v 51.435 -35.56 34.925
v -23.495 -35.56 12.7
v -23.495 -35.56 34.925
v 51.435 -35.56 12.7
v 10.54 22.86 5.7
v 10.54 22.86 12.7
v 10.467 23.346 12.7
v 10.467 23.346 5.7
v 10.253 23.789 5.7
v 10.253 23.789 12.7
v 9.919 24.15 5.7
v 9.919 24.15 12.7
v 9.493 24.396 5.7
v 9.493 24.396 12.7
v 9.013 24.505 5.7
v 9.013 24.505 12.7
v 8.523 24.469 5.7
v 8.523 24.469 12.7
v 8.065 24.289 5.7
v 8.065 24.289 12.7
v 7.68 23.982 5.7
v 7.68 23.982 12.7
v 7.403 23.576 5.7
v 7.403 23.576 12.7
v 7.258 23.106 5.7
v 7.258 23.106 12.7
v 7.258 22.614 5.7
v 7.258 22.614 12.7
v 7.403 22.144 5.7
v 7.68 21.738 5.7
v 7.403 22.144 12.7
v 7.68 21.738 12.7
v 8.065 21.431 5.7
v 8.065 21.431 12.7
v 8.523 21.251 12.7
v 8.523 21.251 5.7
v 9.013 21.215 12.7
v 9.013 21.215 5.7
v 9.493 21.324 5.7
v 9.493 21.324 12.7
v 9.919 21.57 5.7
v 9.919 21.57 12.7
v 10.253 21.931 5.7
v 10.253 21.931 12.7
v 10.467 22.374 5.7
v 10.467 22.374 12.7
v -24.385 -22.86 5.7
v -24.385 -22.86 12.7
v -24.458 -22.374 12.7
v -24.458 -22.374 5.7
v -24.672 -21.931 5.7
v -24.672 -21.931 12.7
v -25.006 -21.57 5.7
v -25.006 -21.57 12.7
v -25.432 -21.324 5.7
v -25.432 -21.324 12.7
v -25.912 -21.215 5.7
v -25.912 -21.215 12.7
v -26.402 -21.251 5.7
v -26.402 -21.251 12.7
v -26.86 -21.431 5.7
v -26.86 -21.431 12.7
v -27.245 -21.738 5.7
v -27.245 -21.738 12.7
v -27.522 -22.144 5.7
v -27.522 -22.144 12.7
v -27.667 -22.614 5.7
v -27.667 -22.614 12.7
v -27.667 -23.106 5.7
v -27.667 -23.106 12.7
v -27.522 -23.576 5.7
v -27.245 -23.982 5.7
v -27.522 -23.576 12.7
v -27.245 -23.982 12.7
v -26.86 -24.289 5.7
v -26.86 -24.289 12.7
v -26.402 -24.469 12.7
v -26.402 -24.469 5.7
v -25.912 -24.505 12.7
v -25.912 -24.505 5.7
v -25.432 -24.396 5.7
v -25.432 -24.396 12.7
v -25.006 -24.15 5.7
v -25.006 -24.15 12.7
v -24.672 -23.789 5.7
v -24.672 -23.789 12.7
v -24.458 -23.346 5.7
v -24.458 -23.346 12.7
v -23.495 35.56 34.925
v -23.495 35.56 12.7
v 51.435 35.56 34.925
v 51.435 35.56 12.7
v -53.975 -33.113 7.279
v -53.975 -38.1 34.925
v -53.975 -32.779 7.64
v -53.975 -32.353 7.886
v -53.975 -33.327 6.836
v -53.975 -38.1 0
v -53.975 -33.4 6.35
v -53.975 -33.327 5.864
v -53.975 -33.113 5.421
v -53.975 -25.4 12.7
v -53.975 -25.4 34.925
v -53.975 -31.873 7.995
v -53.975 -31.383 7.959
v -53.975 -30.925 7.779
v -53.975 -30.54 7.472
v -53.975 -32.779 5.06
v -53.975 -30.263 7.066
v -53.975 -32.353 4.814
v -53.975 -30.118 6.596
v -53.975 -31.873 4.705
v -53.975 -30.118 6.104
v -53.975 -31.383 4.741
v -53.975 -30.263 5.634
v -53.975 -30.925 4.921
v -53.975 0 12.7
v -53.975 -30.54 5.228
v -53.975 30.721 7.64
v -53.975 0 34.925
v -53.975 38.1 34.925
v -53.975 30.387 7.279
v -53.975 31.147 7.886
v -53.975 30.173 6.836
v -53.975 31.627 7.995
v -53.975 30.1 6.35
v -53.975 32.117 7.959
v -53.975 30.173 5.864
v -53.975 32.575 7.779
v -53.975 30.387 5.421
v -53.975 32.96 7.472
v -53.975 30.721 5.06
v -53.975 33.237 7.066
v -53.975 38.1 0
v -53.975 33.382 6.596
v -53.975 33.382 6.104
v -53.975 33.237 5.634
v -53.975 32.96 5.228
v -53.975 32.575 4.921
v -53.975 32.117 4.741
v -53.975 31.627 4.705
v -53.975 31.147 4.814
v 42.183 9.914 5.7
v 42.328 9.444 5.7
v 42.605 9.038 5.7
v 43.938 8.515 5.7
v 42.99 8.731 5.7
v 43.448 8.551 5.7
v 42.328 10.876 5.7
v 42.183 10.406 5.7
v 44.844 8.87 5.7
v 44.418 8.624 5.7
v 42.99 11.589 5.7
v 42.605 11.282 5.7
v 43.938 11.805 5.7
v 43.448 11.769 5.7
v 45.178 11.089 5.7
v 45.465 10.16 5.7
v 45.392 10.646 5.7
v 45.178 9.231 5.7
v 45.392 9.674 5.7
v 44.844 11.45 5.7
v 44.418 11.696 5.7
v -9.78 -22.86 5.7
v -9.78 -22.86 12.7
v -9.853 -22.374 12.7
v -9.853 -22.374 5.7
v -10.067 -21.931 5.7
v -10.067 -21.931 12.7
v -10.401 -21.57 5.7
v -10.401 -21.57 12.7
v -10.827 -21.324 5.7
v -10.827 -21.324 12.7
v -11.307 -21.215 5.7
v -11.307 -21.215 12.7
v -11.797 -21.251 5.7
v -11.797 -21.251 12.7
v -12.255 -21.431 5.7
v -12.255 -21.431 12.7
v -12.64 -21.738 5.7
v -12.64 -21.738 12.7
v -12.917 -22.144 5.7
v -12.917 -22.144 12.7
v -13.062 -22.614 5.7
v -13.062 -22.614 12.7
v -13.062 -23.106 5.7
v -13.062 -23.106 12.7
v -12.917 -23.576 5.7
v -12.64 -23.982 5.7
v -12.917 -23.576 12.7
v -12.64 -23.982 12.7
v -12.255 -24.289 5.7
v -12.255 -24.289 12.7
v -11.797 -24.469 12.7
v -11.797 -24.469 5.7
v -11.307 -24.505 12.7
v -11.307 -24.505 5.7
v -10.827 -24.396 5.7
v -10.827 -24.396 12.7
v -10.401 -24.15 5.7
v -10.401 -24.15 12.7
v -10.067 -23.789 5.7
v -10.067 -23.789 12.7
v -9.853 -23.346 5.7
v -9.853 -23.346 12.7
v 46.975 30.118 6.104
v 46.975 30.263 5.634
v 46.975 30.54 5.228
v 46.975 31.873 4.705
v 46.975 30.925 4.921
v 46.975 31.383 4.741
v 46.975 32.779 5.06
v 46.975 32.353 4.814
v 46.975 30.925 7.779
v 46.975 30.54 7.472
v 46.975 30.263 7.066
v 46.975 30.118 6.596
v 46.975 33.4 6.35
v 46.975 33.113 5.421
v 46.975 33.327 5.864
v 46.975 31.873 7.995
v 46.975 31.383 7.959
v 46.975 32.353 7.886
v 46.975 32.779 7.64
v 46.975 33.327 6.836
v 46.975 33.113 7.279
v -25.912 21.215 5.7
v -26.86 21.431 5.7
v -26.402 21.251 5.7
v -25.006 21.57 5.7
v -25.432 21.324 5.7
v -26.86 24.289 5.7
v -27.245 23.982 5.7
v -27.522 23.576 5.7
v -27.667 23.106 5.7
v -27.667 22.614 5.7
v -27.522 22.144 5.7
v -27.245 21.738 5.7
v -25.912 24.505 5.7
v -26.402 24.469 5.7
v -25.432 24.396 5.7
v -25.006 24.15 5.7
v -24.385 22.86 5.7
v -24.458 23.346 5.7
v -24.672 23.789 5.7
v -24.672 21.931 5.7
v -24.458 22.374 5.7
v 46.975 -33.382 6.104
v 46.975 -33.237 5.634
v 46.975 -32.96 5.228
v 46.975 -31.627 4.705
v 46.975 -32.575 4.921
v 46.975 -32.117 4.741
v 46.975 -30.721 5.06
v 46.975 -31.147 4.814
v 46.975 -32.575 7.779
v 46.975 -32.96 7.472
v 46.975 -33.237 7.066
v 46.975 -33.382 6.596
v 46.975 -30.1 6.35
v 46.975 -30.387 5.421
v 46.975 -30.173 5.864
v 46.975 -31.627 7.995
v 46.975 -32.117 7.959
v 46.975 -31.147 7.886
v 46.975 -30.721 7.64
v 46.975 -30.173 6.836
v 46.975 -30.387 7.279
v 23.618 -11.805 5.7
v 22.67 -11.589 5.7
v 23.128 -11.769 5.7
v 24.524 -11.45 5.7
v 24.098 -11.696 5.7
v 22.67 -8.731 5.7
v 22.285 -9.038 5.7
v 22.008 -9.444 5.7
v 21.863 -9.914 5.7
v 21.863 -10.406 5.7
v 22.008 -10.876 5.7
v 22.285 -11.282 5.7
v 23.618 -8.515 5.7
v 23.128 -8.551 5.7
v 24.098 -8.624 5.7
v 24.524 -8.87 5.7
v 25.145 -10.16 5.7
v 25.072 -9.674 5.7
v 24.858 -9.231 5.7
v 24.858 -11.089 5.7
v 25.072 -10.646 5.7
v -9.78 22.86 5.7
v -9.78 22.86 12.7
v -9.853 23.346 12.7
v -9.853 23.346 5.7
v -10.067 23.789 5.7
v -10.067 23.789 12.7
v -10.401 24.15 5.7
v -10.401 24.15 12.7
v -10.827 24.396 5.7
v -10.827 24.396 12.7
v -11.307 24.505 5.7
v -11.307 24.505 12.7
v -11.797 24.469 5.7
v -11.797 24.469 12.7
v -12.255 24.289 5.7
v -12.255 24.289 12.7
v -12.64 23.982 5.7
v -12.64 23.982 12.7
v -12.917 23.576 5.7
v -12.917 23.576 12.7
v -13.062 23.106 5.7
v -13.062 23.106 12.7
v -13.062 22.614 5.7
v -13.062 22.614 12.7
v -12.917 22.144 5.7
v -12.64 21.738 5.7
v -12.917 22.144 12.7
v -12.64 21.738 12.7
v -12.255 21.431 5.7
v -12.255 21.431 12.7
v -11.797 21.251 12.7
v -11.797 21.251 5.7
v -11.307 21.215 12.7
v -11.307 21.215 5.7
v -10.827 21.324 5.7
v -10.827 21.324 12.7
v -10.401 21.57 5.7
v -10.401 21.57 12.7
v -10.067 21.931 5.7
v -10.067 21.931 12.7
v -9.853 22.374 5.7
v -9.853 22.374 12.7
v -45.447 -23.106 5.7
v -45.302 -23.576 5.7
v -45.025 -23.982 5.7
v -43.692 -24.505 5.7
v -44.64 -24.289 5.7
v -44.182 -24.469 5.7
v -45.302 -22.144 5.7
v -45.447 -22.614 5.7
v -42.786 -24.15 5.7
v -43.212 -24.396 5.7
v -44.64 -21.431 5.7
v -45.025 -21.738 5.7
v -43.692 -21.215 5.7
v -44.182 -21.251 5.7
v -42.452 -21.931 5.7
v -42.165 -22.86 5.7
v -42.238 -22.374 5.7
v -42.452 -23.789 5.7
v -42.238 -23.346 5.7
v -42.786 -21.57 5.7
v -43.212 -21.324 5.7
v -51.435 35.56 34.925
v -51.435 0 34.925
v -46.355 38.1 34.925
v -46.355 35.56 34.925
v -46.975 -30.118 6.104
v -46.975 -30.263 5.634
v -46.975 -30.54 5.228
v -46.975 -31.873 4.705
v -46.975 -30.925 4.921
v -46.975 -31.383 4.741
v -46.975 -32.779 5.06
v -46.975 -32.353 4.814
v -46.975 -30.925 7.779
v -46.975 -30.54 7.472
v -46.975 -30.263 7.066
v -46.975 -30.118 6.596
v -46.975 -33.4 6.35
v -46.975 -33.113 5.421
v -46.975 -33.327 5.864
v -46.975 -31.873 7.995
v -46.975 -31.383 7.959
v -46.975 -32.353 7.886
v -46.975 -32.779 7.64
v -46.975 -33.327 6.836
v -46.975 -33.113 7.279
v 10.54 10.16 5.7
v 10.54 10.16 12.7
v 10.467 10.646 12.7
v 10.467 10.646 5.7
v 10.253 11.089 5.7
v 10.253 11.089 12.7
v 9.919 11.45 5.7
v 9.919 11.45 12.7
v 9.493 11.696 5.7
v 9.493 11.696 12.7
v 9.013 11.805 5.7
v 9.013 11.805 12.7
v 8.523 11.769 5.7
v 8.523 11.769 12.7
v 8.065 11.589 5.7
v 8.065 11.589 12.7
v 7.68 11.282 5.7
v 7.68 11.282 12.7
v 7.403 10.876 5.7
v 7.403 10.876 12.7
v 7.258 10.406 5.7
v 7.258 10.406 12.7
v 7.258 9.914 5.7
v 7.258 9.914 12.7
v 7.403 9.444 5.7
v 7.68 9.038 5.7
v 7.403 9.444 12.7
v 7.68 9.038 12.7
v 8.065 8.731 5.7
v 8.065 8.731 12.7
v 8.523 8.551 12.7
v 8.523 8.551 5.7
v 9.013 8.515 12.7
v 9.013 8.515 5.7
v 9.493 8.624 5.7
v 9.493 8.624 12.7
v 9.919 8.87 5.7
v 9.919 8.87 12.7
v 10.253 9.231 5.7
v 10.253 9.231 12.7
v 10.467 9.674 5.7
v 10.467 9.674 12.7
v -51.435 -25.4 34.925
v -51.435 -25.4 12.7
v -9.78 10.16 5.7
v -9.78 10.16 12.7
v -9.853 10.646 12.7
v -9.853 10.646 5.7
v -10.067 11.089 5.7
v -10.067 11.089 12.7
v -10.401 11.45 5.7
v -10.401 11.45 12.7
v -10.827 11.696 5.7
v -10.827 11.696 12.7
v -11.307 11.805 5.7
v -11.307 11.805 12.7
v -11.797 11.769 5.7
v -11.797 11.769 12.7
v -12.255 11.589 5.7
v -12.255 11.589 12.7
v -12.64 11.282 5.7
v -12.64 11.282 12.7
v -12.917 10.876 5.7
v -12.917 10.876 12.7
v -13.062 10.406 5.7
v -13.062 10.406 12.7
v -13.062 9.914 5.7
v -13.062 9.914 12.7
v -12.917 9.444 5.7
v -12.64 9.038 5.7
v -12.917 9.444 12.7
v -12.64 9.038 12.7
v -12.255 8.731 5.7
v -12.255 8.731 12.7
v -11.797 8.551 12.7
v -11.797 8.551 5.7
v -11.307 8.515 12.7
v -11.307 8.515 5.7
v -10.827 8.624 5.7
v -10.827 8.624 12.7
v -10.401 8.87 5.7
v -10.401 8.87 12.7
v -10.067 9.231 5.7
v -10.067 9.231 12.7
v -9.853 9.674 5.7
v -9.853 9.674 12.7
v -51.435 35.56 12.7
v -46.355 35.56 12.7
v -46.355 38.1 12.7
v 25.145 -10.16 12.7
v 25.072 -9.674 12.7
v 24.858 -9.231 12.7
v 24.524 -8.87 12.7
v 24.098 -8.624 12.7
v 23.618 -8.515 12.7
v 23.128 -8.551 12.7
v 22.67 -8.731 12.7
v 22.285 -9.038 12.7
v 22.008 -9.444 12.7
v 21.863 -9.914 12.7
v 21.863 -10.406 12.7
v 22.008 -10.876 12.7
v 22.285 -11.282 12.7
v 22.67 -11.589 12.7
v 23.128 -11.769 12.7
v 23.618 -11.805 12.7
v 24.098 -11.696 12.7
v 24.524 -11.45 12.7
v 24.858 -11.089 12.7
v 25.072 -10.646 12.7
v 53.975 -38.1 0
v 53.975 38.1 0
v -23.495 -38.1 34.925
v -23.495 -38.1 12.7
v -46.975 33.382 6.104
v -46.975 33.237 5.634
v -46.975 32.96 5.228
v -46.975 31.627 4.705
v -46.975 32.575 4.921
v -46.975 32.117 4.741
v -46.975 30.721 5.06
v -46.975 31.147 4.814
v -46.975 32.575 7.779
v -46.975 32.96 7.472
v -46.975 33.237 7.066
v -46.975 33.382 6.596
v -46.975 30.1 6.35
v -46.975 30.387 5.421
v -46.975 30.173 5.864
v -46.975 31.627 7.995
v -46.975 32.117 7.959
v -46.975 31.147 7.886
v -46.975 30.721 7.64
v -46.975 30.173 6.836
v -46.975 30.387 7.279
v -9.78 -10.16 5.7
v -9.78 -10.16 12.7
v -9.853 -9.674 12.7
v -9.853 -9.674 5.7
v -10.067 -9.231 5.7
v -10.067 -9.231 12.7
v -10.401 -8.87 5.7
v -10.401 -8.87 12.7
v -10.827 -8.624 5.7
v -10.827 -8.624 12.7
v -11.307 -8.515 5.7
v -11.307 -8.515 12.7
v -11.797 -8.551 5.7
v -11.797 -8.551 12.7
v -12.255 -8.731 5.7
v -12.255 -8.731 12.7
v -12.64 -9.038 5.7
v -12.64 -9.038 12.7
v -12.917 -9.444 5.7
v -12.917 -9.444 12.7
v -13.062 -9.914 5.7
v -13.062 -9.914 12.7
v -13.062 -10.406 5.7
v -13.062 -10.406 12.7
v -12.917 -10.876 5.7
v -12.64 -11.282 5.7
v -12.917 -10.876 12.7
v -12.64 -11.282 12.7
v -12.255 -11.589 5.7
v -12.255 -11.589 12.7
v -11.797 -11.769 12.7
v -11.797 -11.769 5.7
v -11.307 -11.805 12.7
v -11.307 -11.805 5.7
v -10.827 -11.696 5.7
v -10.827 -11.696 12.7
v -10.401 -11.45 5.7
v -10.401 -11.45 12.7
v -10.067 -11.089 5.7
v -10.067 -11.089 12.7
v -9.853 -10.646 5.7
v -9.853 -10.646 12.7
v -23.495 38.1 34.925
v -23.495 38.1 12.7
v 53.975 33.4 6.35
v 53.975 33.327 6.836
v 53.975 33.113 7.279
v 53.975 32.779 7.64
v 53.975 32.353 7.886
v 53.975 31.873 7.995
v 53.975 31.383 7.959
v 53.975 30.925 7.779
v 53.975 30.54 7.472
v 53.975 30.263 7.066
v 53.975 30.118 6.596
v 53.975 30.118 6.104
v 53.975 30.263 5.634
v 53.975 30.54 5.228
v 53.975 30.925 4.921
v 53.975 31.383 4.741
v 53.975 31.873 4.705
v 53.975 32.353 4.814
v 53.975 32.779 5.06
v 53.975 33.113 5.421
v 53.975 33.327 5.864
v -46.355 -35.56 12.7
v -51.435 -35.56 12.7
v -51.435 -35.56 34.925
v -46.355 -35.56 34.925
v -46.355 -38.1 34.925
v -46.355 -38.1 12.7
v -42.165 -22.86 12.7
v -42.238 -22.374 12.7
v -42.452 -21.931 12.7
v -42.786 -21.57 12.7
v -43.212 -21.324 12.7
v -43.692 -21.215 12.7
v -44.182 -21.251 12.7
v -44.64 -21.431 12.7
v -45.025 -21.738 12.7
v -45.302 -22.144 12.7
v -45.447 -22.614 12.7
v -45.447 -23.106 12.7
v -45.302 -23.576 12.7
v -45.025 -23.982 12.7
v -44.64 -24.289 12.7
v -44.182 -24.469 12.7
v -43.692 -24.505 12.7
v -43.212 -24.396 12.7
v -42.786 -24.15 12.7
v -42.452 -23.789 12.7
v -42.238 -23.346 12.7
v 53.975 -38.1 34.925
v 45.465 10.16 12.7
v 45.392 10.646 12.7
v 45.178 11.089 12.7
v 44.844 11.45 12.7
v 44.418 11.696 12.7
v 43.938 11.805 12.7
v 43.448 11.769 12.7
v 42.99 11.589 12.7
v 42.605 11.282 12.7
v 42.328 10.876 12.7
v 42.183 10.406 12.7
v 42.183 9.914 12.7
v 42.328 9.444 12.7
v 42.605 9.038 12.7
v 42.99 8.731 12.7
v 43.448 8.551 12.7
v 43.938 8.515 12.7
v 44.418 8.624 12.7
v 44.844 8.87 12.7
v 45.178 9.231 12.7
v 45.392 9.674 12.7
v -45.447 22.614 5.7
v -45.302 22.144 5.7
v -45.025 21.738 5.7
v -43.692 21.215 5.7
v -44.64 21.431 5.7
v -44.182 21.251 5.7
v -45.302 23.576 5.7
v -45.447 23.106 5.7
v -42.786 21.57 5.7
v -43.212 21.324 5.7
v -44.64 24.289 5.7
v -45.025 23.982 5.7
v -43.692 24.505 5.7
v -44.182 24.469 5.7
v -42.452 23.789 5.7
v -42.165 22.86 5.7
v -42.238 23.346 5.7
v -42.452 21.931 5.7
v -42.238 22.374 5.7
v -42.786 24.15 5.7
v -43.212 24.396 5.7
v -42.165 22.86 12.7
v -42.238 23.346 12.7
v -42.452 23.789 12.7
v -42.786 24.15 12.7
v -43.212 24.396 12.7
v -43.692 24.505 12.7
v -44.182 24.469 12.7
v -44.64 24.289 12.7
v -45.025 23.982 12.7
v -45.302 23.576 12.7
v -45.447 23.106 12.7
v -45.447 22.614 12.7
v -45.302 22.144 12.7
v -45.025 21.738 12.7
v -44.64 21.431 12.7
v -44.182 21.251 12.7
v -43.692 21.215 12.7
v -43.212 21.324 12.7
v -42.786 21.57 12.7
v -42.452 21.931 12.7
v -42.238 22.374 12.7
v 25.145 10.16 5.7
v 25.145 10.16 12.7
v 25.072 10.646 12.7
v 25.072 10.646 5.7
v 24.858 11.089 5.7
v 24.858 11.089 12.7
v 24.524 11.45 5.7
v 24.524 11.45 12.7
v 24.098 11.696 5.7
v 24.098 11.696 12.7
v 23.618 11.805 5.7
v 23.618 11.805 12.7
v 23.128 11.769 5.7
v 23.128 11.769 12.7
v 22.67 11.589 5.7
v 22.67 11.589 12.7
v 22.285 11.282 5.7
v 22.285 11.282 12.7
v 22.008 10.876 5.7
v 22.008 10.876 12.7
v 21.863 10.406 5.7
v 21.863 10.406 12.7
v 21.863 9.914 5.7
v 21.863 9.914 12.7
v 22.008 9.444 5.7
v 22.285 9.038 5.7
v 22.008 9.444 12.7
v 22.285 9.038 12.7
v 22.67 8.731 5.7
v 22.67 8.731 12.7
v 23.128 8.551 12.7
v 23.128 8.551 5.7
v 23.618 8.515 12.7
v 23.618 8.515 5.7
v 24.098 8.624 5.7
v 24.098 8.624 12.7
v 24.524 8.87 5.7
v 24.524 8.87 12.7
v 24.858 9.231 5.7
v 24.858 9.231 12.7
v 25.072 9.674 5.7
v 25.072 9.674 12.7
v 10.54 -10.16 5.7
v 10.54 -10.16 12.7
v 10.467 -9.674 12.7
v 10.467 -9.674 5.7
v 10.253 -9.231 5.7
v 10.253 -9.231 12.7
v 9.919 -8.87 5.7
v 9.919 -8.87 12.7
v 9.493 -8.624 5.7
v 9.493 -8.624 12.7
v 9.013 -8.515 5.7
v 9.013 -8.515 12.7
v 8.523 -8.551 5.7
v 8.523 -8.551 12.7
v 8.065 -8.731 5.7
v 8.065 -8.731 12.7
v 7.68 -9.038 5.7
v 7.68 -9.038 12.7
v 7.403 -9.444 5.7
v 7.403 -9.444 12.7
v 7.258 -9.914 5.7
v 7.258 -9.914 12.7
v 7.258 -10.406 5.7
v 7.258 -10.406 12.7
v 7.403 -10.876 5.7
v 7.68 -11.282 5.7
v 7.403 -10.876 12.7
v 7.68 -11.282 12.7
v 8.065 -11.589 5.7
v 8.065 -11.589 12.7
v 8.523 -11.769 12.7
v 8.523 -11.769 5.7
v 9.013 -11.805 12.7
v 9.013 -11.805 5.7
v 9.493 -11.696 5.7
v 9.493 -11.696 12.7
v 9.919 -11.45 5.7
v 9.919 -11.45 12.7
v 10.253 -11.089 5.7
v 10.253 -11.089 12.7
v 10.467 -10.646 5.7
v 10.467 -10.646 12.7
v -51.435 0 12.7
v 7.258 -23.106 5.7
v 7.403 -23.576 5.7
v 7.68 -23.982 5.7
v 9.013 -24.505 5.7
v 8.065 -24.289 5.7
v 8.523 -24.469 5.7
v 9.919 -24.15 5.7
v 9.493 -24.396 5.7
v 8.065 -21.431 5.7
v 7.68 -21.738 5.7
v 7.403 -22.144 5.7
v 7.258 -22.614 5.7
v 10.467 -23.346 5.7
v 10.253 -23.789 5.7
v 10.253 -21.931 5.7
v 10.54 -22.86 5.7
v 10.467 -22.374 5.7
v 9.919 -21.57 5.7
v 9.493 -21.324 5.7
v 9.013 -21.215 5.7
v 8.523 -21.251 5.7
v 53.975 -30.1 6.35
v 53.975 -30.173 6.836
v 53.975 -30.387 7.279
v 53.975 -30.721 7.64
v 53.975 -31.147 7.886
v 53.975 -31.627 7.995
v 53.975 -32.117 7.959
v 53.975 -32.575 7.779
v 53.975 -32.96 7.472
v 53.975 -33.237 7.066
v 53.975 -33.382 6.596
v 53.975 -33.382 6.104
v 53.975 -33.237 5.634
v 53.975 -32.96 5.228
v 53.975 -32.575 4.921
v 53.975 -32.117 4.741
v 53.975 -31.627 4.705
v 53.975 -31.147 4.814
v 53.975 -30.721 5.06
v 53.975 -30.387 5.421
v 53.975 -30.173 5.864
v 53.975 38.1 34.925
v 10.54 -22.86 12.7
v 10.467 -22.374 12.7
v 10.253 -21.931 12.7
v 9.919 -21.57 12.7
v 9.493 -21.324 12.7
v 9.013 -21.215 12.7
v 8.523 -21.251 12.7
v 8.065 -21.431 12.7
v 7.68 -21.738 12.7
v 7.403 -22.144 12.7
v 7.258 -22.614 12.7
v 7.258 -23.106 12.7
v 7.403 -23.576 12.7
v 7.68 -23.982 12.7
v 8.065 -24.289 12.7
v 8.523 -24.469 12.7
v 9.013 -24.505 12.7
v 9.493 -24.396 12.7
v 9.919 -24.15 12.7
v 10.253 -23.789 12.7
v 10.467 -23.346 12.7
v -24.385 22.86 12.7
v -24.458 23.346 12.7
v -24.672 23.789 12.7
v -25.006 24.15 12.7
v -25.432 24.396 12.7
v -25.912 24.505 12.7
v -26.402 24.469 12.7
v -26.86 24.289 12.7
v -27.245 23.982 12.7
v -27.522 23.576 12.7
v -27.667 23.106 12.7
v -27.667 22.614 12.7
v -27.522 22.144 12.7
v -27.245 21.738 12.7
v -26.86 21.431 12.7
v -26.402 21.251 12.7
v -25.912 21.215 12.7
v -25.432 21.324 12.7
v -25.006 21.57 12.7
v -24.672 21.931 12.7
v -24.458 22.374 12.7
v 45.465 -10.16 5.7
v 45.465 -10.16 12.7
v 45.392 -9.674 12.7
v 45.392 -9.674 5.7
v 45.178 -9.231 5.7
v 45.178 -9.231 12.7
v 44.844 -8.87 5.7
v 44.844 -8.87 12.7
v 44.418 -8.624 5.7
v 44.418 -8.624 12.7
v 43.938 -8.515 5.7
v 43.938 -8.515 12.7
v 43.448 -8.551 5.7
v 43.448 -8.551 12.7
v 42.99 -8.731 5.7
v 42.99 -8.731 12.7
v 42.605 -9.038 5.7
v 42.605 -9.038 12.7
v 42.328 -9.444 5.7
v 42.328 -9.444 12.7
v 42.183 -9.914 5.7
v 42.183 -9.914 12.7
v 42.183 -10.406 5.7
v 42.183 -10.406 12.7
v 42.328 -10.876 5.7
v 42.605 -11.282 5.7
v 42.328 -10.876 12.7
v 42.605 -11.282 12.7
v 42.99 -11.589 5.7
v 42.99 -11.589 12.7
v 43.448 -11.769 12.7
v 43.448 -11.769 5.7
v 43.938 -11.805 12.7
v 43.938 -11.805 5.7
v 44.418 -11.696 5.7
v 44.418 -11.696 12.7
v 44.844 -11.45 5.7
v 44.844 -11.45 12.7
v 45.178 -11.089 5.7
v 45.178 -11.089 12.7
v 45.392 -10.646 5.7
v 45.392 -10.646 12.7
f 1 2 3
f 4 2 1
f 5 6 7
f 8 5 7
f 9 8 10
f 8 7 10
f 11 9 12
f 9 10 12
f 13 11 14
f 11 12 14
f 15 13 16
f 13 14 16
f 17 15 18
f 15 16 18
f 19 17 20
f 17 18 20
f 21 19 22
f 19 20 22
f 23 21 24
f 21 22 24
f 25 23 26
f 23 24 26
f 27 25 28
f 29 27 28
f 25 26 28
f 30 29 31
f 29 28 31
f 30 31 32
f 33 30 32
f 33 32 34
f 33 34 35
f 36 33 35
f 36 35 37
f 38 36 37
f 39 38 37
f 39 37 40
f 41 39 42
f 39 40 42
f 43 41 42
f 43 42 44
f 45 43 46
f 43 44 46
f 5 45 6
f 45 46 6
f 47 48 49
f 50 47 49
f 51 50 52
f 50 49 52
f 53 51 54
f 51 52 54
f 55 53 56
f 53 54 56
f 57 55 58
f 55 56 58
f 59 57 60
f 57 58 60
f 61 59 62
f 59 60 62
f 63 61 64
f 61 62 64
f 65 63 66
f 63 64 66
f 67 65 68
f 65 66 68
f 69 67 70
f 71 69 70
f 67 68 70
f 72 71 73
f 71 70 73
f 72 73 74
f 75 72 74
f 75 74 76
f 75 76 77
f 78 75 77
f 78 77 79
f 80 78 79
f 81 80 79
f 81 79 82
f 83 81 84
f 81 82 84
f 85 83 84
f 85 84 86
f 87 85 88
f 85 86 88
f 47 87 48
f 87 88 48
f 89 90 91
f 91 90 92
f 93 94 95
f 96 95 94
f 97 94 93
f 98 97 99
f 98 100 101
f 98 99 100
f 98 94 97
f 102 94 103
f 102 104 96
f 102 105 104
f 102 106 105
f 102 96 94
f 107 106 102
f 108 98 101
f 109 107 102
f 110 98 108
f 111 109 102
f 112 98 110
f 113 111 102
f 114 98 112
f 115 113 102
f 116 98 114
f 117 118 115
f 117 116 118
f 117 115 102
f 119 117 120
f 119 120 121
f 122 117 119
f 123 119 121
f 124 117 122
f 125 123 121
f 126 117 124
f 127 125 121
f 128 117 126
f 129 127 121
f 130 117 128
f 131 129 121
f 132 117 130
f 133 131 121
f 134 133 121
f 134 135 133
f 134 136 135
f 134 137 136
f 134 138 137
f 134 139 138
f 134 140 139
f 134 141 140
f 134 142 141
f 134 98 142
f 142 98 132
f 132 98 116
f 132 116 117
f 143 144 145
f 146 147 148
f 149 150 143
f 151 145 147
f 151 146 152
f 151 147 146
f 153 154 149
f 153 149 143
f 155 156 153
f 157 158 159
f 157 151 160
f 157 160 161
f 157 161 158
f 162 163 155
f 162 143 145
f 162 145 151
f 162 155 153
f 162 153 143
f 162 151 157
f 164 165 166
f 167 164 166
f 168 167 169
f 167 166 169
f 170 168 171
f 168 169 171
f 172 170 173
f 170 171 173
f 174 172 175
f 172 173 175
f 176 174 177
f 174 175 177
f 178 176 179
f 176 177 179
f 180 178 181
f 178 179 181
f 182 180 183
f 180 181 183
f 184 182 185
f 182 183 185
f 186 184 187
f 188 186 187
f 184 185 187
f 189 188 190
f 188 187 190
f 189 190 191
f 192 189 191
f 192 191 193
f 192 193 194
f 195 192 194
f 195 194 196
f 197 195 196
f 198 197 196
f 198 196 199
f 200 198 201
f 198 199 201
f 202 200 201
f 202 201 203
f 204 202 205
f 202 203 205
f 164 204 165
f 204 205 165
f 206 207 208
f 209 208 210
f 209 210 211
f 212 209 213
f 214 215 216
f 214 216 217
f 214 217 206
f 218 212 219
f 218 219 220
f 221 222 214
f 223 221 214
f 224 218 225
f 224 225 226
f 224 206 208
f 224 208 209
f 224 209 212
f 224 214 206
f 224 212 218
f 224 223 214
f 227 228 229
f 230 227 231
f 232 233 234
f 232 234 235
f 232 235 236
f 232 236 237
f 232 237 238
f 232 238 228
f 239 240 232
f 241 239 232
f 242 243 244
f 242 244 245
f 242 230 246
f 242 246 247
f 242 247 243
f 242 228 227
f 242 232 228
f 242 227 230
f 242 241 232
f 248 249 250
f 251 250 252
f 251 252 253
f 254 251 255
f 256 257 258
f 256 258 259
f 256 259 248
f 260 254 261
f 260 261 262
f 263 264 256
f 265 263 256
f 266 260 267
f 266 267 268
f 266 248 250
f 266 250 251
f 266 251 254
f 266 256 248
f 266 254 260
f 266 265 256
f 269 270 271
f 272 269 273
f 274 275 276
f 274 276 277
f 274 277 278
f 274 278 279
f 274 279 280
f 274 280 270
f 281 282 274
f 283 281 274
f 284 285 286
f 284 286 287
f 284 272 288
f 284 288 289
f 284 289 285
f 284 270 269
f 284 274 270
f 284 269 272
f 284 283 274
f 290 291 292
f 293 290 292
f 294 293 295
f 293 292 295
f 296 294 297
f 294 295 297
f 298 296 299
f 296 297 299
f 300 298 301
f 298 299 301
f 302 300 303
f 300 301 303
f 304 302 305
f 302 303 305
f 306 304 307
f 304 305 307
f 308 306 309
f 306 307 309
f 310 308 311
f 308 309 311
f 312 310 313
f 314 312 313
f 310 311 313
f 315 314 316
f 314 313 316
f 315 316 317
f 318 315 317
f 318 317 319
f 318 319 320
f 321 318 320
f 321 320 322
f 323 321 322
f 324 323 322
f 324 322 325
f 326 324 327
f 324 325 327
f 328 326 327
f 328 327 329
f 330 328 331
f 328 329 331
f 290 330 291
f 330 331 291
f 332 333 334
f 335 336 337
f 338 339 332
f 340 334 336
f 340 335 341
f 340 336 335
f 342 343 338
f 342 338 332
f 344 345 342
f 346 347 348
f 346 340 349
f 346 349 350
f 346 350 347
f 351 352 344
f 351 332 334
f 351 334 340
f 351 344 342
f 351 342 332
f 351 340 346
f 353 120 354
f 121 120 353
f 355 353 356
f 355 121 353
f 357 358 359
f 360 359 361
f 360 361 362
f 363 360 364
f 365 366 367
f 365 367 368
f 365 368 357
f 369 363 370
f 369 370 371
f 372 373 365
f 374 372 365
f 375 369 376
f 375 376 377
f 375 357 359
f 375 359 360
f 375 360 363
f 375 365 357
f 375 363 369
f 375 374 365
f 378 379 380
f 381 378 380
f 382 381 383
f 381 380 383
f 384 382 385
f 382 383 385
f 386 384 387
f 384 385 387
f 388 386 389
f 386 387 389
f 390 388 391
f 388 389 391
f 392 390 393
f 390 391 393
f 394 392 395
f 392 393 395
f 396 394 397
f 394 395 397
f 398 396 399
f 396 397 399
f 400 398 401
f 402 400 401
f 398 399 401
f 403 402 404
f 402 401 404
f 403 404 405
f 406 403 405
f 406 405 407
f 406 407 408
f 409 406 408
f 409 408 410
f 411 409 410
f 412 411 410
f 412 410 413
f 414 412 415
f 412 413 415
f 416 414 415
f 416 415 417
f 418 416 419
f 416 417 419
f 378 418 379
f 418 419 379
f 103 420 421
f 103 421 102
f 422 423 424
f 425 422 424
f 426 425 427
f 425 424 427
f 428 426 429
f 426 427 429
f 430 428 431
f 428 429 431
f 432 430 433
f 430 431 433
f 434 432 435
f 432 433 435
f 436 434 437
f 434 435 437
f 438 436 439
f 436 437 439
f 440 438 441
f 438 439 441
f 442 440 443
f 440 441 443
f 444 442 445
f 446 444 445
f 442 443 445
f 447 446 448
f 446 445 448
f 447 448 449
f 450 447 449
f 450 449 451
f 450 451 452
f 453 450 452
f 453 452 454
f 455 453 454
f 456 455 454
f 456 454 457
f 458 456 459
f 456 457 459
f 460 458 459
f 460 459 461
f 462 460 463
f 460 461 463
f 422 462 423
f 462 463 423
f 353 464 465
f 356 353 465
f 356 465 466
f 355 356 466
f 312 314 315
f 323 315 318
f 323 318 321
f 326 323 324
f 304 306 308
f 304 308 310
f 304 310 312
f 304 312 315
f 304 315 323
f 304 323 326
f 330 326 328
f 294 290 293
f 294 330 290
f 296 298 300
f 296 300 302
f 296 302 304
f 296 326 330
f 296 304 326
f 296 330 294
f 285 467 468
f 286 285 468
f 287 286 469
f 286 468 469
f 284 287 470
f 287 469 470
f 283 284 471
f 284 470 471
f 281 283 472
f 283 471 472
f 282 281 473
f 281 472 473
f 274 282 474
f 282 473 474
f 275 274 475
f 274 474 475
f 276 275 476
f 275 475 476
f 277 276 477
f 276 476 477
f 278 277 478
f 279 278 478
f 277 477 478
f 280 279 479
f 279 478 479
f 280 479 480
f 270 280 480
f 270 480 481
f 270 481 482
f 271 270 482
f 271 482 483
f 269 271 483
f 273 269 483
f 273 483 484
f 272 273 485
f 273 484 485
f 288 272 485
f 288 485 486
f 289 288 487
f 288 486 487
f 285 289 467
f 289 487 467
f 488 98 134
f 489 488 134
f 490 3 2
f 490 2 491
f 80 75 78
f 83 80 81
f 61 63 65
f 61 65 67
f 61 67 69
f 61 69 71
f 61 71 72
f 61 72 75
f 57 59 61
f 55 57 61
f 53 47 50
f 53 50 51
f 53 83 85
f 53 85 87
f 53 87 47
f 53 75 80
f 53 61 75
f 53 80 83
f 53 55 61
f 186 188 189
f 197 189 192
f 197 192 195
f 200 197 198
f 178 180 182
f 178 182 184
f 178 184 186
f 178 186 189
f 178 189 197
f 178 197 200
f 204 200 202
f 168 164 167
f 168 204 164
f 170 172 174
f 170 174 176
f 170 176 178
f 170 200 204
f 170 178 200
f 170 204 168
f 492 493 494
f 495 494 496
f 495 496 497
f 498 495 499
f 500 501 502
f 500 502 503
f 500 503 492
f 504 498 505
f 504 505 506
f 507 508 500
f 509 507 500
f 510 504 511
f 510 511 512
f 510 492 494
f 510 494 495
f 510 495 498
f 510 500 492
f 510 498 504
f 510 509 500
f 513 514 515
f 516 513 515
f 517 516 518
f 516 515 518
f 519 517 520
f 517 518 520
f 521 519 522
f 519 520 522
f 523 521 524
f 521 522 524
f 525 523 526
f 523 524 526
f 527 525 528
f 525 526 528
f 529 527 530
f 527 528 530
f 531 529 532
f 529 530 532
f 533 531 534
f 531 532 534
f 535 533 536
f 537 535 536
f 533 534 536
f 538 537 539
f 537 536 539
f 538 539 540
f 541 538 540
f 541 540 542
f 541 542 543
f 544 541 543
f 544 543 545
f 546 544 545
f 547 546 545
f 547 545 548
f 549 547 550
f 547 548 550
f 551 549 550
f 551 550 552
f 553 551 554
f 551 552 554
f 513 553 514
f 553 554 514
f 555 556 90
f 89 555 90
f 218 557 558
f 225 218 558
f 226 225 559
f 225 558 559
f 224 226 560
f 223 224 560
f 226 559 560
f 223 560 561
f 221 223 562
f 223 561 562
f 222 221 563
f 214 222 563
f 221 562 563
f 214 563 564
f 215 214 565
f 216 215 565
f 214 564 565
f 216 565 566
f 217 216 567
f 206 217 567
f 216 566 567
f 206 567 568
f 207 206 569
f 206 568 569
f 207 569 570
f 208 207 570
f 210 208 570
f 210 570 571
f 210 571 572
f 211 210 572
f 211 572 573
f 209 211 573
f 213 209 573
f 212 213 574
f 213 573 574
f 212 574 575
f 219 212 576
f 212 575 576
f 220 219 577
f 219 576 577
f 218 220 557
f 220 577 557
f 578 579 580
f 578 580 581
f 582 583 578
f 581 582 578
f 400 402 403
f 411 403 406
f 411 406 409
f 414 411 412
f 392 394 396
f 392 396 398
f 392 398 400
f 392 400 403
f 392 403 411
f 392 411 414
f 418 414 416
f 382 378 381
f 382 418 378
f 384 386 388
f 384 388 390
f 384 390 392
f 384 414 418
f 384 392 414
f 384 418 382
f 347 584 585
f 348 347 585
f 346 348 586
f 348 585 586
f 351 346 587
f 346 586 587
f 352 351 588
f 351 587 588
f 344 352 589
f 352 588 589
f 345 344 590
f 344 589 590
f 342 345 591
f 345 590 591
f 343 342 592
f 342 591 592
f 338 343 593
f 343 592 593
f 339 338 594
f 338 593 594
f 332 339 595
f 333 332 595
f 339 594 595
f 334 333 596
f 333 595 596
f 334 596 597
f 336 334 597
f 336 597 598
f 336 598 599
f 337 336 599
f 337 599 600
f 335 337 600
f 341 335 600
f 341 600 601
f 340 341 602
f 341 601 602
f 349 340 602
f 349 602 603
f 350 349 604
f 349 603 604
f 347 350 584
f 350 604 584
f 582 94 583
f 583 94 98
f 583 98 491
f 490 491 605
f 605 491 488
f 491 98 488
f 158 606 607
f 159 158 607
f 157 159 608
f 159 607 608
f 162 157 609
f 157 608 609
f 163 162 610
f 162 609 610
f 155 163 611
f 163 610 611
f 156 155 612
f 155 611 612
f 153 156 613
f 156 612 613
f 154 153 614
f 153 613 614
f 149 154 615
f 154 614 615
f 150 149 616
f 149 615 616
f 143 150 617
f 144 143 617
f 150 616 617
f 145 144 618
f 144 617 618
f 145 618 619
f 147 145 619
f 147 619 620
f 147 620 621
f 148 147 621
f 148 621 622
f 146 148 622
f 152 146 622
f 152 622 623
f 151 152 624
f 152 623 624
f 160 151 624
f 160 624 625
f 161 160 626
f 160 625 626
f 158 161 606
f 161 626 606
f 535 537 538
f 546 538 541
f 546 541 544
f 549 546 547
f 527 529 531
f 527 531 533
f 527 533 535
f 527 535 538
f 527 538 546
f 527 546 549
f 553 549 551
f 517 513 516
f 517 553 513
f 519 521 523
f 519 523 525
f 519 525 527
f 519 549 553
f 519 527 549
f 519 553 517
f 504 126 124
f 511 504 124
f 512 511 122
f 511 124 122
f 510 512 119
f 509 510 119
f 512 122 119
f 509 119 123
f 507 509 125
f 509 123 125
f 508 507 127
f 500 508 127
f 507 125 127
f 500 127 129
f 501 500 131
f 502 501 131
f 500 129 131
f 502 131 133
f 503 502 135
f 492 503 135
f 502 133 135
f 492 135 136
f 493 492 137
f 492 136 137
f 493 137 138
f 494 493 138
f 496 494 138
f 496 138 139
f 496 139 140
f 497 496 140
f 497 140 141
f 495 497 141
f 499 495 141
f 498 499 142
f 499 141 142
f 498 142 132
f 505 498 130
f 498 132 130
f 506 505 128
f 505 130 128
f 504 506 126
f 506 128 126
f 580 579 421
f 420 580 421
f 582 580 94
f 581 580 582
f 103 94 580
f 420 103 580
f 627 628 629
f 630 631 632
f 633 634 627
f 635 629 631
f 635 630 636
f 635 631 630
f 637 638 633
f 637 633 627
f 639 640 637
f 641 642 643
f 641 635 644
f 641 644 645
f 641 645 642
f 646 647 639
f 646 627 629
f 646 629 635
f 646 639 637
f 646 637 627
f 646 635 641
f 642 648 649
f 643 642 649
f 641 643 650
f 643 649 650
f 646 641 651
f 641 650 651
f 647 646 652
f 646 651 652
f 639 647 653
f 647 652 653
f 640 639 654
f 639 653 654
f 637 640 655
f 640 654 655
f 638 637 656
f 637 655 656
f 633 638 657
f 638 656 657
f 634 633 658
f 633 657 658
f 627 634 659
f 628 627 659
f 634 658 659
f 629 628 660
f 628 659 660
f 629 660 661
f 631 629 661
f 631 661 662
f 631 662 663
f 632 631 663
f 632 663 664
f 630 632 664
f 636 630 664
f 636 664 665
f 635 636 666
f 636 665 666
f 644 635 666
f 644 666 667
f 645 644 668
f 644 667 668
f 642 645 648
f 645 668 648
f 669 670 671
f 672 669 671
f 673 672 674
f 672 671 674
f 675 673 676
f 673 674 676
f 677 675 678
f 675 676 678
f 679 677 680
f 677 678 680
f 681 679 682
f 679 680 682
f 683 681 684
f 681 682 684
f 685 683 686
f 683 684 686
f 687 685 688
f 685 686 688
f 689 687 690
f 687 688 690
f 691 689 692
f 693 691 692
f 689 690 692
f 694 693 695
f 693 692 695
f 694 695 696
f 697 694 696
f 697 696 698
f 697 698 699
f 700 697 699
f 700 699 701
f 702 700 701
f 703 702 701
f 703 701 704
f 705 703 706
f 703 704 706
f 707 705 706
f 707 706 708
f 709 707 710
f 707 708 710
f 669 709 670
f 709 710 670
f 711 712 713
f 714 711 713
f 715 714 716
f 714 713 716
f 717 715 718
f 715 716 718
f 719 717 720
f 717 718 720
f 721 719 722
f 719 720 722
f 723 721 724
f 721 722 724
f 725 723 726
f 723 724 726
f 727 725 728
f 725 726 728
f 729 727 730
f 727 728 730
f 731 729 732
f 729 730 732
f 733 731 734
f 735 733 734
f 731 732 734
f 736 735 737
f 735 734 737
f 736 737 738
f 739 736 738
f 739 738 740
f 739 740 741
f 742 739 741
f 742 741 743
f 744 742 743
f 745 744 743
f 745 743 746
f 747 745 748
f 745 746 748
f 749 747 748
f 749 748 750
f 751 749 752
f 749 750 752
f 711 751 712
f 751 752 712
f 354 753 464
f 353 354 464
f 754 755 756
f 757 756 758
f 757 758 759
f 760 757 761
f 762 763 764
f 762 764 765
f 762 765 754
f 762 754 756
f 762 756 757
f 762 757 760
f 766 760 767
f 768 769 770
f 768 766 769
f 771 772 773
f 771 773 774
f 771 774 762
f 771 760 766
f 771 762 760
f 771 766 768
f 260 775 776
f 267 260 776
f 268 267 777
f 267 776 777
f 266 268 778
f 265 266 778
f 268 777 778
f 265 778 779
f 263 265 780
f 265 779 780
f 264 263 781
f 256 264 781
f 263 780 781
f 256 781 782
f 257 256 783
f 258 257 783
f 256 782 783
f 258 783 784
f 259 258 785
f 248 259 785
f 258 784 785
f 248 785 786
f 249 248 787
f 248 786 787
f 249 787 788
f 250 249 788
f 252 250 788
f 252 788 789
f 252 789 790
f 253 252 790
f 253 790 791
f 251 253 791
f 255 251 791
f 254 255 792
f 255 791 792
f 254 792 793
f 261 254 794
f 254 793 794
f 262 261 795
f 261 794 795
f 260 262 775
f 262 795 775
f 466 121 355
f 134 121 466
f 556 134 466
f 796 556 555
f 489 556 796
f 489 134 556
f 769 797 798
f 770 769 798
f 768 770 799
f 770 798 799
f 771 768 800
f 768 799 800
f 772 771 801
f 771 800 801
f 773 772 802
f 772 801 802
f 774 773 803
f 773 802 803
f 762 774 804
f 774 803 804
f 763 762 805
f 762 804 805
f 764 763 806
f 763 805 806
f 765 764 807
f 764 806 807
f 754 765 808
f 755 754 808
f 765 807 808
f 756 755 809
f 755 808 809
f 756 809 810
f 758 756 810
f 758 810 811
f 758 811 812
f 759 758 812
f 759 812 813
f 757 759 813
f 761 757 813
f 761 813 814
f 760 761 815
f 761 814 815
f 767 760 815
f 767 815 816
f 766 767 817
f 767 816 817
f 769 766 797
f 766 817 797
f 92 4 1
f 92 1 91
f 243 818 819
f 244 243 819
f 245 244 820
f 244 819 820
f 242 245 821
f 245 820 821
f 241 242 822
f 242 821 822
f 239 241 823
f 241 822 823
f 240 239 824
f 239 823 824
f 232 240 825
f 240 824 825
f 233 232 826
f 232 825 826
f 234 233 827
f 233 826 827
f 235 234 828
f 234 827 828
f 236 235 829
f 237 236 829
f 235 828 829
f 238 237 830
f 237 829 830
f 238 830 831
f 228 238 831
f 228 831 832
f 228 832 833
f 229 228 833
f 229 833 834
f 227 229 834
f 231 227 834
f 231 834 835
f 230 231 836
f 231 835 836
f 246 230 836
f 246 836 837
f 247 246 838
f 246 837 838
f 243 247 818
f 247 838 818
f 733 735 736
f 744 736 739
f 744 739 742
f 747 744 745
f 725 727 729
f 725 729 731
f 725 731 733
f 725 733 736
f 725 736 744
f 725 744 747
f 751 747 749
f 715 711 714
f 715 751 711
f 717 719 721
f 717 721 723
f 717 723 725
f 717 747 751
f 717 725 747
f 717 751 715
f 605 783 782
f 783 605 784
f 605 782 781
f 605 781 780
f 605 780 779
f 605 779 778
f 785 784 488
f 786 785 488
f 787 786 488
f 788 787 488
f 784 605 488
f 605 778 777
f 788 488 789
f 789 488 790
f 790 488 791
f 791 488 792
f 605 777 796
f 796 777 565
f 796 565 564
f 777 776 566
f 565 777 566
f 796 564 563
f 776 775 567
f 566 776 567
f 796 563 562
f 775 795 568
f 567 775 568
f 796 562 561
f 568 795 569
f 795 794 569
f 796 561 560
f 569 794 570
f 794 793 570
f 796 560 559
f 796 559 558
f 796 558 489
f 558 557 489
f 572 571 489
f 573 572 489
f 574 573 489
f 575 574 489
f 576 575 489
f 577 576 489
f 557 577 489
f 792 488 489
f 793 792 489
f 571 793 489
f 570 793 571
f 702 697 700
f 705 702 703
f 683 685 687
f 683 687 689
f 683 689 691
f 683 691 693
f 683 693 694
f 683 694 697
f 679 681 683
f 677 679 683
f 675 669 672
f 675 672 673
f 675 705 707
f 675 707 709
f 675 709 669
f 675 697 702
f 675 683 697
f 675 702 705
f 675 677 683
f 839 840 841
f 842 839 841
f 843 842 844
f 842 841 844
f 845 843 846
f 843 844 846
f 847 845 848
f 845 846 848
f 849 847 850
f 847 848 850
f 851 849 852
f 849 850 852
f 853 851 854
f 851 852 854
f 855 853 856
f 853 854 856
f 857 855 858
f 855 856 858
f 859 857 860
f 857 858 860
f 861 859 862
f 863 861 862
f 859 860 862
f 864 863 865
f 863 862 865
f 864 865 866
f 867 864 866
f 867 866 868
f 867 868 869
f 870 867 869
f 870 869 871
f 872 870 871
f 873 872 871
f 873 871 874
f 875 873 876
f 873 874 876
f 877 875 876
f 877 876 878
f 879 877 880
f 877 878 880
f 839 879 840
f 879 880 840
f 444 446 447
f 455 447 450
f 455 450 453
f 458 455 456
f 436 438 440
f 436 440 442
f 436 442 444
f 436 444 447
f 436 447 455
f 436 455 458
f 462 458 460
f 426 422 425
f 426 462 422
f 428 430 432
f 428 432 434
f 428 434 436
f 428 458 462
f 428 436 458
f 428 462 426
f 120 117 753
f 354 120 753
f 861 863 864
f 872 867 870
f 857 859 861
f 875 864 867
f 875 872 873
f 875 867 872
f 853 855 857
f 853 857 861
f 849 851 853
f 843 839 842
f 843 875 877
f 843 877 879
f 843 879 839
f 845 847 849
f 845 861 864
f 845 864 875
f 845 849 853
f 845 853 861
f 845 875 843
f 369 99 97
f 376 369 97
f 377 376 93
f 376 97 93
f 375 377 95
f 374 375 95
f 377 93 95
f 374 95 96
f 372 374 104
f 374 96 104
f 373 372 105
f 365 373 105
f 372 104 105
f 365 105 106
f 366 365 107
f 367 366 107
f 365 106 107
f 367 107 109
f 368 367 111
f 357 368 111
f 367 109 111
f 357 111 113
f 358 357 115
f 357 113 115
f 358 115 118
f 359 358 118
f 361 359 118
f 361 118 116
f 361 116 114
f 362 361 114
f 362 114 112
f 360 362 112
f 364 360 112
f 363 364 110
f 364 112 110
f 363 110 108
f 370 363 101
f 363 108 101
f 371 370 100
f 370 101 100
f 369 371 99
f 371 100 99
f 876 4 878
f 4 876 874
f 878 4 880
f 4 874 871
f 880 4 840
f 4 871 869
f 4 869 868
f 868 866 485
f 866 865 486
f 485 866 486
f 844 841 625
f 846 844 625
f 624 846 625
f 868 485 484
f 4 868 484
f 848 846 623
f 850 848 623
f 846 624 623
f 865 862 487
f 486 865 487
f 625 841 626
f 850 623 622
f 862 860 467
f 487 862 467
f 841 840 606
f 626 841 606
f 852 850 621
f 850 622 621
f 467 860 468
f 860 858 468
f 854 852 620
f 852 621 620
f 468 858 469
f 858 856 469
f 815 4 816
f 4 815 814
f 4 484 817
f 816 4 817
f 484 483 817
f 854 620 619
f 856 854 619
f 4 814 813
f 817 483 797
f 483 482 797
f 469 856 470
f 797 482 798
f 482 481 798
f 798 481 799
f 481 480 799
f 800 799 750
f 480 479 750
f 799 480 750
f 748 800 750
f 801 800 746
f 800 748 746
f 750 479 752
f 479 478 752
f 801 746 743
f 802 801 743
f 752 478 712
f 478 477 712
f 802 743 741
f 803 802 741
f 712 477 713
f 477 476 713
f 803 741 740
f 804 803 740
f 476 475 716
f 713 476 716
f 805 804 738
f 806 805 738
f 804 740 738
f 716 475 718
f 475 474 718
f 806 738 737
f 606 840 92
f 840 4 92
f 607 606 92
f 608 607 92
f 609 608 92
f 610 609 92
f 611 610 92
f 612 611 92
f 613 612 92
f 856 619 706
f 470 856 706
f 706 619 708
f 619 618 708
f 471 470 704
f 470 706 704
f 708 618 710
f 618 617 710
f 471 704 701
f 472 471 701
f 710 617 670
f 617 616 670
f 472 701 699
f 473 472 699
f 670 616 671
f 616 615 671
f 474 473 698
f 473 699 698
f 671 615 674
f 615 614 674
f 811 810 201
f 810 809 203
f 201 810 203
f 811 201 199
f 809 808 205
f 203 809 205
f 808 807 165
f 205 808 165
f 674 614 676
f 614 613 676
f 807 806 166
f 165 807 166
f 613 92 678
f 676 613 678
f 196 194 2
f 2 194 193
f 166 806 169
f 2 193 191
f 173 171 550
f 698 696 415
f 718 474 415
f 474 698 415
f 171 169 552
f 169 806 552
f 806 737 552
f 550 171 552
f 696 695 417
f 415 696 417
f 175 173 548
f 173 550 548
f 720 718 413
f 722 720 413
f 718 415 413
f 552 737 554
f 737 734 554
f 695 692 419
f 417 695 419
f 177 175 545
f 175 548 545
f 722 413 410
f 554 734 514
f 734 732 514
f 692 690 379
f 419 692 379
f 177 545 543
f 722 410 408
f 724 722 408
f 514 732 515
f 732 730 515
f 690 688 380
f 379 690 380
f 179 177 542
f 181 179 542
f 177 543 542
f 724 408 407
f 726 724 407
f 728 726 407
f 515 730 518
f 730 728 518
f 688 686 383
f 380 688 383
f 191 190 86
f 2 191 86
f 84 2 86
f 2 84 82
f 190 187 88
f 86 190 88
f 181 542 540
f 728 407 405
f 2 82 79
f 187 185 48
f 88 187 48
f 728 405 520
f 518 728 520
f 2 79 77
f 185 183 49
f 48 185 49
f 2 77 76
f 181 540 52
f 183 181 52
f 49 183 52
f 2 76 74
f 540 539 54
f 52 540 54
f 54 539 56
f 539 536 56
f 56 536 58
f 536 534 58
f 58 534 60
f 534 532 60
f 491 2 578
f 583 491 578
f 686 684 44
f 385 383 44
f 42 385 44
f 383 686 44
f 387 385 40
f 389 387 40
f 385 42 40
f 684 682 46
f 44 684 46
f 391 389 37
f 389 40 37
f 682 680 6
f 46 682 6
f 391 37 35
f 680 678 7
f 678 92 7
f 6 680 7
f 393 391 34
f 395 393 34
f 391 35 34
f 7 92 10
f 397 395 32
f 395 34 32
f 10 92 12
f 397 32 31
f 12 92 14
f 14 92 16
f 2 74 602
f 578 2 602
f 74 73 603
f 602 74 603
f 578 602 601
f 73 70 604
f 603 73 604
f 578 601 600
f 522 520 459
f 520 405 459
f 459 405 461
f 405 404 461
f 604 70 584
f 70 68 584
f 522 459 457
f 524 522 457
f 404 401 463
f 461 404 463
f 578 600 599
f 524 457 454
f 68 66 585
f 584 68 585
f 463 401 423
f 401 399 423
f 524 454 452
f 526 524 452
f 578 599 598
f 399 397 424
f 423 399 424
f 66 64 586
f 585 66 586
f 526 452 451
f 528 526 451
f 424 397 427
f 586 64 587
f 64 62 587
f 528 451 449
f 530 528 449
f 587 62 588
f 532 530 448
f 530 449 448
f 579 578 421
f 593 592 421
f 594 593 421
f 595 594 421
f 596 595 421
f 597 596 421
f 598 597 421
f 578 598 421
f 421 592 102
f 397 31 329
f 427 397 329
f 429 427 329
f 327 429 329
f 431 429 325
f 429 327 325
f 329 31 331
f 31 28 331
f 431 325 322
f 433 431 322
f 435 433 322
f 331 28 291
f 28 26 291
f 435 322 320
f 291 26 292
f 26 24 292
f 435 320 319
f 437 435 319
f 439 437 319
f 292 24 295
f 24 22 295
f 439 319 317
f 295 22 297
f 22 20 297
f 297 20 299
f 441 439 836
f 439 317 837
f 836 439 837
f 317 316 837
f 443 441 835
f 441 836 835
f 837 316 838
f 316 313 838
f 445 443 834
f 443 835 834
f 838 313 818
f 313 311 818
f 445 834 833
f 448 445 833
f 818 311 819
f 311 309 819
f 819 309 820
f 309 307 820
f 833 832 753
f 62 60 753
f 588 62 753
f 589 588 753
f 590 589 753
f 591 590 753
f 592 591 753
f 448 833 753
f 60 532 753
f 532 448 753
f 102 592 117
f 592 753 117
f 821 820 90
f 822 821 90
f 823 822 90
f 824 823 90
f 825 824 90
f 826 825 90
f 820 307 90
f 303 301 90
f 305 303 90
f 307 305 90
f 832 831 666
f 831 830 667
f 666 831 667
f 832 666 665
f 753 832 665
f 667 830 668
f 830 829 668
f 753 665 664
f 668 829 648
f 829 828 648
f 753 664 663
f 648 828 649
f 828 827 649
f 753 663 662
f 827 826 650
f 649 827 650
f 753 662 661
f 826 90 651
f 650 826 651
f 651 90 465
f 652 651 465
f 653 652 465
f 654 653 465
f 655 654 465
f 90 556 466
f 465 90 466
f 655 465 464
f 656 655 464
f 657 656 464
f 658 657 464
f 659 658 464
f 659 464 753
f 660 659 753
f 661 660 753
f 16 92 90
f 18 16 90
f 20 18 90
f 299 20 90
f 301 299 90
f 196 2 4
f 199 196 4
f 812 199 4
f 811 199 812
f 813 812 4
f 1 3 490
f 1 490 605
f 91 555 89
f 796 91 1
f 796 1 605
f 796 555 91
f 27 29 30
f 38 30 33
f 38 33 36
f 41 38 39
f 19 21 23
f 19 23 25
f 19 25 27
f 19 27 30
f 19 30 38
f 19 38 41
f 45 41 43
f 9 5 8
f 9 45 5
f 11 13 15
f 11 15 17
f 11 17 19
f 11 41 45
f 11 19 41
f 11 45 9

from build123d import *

# Parameters (mm, degrees)
SKETCH1_W          = 76.2
SKETCH1_H          = 107.95
BASE_DEPTH         = 12.7
SKETCH3_W          = 107.95
SKETCH3_H          = 76.2
SKETCH3_W_2        = 102.87
SKETCH3_H_2        = 71.12
WALLS_DEPTH        = 22.225
CUT_EXTRUDE1_DEPTH = 22.225
SKETCH2_R          = 1.650000002
CUT_EXTRUDE2_DEPTH = 6.99999997
SKETCH6_R          = 1.650000002
CUT_EXTRUDE3_DEPTH = 6.99999997
SKETCH7_R          = 1.650000002
CUT_EXTRUDE4_DEPTH = 6.99999997


with BuildPart() as part:
    # Sketch1 → BASE (new body)
    with BuildSketch(Plane(origin=(0, 0, 0), x_dir=(0, 1, 0), z_dir=(0, 0, 1))):
        Rectangle(SKETCH1_W, SKETCH1_H)
    extrude(amount=BASE_DEPTH)

    # Sketch3 → WALLS (add)
    with BuildSketch(Plane.XY.offset(12.7)):
        Rectangle(SKETCH3_W, SKETCH3_H)
        Rectangle(SKETCH3_W_2, SKETCH3_H_2, mode=Mode.SUBTRACT)
    extrude(amount=WALLS_DEPTH)

    # Sketch4 → Cut-Extrude1 (cut)
    with BuildSketch(Plane.XY.offset(34.925)):
        Polygon((-46.355, 38.1), (-23.495, 38.1), (-23.495, -38.1), (-46.355, -38.1), (-46.355, -25.4), (-53.975, -25.4), (-53.975, 0), (-46.355, 0), align=None)
    extrude(amount=-CUT_EXTRUDE1_DEPTH, mode=Mode.SUBTRACT)

    # Sketch2 → Cut-Extrude2 (cut)
    with BuildSketch(Plane.XY.offset(12.7)):
        with Locations((-43.815, 22.86)):
            Circle(SKETCH2_R)
        with Locations((-26.035, 22.86)):
            Circle(SKETCH2_R)
        with Locations((-43.815, -22.86)):
            Circle(SKETCH2_R)
        with Locations((-26.035, -22.86)):
            Circle(SKETCH2_R)
        with Locations((-11.43, -22.86)):
            Circle(SKETCH2_R)
        with Locations((-11.43, -10.16)):
            Circle(SKETCH2_R)
        with Locations((8.89, -10.16)):
            Circle(SKETCH2_R)
        with Locations((8.89, -22.86)):
            Circle(SKETCH2_R)
        with Locations((23.495, -10.16)):
            Circle(SKETCH2_R)
        with Locations((43.815, -10.16)):
            Circle(SKETCH2_R)
        with Locations((43.815, 10.16)):
            Circle(SKETCH2_R)
        with Locations((23.495, 10.16)):
            Circle(SKETCH2_R)
        with Locations((-11.43, 10.16)):
            Circle(SKETCH2_R)
        with Locations((8.89, 22.86)):
            Circle(SKETCH2_R)
        with Locations((-11.43, 22.86)):
            Circle(SKETCH2_R)
        with Locations((8.89, 10.16)):
            Circle(SKETCH2_R)
    extrude(amount=-CUT_EXTRUDE2_DEPTH, mode=Mode.SUBTRACT)

    # Sketch6 → Cut-Extrude3 (cut)
    with BuildSketch(Plane(origin=(-53.975, 0, 0), x_dir=(0, -1, 0), z_dir=(-1, 0, 0))):
        with Locations((-31.75, 6.35)):
            Circle(SKETCH6_R)
        with Locations((31.75, 6.35)):
            Circle(SKETCH6_R)
    extrude(amount=-CUT_EXTRUDE3_DEPTH, mode=Mode.SUBTRACT)

    # Sketch7 → Cut-Extrude4 (cut)
    with BuildSketch(Plane.YZ.offset(53.975)):
        with Locations((-31.75, 6.35)):
            Circle(SKETCH7_R)
        with Locations((31.75, 6.35)):
            Circle(SKETCH7_R)
    extrude(amount=-CUT_EXTRUDE4_DEPTH, mode=Mode.SUBTRACT)


solid = part.part
